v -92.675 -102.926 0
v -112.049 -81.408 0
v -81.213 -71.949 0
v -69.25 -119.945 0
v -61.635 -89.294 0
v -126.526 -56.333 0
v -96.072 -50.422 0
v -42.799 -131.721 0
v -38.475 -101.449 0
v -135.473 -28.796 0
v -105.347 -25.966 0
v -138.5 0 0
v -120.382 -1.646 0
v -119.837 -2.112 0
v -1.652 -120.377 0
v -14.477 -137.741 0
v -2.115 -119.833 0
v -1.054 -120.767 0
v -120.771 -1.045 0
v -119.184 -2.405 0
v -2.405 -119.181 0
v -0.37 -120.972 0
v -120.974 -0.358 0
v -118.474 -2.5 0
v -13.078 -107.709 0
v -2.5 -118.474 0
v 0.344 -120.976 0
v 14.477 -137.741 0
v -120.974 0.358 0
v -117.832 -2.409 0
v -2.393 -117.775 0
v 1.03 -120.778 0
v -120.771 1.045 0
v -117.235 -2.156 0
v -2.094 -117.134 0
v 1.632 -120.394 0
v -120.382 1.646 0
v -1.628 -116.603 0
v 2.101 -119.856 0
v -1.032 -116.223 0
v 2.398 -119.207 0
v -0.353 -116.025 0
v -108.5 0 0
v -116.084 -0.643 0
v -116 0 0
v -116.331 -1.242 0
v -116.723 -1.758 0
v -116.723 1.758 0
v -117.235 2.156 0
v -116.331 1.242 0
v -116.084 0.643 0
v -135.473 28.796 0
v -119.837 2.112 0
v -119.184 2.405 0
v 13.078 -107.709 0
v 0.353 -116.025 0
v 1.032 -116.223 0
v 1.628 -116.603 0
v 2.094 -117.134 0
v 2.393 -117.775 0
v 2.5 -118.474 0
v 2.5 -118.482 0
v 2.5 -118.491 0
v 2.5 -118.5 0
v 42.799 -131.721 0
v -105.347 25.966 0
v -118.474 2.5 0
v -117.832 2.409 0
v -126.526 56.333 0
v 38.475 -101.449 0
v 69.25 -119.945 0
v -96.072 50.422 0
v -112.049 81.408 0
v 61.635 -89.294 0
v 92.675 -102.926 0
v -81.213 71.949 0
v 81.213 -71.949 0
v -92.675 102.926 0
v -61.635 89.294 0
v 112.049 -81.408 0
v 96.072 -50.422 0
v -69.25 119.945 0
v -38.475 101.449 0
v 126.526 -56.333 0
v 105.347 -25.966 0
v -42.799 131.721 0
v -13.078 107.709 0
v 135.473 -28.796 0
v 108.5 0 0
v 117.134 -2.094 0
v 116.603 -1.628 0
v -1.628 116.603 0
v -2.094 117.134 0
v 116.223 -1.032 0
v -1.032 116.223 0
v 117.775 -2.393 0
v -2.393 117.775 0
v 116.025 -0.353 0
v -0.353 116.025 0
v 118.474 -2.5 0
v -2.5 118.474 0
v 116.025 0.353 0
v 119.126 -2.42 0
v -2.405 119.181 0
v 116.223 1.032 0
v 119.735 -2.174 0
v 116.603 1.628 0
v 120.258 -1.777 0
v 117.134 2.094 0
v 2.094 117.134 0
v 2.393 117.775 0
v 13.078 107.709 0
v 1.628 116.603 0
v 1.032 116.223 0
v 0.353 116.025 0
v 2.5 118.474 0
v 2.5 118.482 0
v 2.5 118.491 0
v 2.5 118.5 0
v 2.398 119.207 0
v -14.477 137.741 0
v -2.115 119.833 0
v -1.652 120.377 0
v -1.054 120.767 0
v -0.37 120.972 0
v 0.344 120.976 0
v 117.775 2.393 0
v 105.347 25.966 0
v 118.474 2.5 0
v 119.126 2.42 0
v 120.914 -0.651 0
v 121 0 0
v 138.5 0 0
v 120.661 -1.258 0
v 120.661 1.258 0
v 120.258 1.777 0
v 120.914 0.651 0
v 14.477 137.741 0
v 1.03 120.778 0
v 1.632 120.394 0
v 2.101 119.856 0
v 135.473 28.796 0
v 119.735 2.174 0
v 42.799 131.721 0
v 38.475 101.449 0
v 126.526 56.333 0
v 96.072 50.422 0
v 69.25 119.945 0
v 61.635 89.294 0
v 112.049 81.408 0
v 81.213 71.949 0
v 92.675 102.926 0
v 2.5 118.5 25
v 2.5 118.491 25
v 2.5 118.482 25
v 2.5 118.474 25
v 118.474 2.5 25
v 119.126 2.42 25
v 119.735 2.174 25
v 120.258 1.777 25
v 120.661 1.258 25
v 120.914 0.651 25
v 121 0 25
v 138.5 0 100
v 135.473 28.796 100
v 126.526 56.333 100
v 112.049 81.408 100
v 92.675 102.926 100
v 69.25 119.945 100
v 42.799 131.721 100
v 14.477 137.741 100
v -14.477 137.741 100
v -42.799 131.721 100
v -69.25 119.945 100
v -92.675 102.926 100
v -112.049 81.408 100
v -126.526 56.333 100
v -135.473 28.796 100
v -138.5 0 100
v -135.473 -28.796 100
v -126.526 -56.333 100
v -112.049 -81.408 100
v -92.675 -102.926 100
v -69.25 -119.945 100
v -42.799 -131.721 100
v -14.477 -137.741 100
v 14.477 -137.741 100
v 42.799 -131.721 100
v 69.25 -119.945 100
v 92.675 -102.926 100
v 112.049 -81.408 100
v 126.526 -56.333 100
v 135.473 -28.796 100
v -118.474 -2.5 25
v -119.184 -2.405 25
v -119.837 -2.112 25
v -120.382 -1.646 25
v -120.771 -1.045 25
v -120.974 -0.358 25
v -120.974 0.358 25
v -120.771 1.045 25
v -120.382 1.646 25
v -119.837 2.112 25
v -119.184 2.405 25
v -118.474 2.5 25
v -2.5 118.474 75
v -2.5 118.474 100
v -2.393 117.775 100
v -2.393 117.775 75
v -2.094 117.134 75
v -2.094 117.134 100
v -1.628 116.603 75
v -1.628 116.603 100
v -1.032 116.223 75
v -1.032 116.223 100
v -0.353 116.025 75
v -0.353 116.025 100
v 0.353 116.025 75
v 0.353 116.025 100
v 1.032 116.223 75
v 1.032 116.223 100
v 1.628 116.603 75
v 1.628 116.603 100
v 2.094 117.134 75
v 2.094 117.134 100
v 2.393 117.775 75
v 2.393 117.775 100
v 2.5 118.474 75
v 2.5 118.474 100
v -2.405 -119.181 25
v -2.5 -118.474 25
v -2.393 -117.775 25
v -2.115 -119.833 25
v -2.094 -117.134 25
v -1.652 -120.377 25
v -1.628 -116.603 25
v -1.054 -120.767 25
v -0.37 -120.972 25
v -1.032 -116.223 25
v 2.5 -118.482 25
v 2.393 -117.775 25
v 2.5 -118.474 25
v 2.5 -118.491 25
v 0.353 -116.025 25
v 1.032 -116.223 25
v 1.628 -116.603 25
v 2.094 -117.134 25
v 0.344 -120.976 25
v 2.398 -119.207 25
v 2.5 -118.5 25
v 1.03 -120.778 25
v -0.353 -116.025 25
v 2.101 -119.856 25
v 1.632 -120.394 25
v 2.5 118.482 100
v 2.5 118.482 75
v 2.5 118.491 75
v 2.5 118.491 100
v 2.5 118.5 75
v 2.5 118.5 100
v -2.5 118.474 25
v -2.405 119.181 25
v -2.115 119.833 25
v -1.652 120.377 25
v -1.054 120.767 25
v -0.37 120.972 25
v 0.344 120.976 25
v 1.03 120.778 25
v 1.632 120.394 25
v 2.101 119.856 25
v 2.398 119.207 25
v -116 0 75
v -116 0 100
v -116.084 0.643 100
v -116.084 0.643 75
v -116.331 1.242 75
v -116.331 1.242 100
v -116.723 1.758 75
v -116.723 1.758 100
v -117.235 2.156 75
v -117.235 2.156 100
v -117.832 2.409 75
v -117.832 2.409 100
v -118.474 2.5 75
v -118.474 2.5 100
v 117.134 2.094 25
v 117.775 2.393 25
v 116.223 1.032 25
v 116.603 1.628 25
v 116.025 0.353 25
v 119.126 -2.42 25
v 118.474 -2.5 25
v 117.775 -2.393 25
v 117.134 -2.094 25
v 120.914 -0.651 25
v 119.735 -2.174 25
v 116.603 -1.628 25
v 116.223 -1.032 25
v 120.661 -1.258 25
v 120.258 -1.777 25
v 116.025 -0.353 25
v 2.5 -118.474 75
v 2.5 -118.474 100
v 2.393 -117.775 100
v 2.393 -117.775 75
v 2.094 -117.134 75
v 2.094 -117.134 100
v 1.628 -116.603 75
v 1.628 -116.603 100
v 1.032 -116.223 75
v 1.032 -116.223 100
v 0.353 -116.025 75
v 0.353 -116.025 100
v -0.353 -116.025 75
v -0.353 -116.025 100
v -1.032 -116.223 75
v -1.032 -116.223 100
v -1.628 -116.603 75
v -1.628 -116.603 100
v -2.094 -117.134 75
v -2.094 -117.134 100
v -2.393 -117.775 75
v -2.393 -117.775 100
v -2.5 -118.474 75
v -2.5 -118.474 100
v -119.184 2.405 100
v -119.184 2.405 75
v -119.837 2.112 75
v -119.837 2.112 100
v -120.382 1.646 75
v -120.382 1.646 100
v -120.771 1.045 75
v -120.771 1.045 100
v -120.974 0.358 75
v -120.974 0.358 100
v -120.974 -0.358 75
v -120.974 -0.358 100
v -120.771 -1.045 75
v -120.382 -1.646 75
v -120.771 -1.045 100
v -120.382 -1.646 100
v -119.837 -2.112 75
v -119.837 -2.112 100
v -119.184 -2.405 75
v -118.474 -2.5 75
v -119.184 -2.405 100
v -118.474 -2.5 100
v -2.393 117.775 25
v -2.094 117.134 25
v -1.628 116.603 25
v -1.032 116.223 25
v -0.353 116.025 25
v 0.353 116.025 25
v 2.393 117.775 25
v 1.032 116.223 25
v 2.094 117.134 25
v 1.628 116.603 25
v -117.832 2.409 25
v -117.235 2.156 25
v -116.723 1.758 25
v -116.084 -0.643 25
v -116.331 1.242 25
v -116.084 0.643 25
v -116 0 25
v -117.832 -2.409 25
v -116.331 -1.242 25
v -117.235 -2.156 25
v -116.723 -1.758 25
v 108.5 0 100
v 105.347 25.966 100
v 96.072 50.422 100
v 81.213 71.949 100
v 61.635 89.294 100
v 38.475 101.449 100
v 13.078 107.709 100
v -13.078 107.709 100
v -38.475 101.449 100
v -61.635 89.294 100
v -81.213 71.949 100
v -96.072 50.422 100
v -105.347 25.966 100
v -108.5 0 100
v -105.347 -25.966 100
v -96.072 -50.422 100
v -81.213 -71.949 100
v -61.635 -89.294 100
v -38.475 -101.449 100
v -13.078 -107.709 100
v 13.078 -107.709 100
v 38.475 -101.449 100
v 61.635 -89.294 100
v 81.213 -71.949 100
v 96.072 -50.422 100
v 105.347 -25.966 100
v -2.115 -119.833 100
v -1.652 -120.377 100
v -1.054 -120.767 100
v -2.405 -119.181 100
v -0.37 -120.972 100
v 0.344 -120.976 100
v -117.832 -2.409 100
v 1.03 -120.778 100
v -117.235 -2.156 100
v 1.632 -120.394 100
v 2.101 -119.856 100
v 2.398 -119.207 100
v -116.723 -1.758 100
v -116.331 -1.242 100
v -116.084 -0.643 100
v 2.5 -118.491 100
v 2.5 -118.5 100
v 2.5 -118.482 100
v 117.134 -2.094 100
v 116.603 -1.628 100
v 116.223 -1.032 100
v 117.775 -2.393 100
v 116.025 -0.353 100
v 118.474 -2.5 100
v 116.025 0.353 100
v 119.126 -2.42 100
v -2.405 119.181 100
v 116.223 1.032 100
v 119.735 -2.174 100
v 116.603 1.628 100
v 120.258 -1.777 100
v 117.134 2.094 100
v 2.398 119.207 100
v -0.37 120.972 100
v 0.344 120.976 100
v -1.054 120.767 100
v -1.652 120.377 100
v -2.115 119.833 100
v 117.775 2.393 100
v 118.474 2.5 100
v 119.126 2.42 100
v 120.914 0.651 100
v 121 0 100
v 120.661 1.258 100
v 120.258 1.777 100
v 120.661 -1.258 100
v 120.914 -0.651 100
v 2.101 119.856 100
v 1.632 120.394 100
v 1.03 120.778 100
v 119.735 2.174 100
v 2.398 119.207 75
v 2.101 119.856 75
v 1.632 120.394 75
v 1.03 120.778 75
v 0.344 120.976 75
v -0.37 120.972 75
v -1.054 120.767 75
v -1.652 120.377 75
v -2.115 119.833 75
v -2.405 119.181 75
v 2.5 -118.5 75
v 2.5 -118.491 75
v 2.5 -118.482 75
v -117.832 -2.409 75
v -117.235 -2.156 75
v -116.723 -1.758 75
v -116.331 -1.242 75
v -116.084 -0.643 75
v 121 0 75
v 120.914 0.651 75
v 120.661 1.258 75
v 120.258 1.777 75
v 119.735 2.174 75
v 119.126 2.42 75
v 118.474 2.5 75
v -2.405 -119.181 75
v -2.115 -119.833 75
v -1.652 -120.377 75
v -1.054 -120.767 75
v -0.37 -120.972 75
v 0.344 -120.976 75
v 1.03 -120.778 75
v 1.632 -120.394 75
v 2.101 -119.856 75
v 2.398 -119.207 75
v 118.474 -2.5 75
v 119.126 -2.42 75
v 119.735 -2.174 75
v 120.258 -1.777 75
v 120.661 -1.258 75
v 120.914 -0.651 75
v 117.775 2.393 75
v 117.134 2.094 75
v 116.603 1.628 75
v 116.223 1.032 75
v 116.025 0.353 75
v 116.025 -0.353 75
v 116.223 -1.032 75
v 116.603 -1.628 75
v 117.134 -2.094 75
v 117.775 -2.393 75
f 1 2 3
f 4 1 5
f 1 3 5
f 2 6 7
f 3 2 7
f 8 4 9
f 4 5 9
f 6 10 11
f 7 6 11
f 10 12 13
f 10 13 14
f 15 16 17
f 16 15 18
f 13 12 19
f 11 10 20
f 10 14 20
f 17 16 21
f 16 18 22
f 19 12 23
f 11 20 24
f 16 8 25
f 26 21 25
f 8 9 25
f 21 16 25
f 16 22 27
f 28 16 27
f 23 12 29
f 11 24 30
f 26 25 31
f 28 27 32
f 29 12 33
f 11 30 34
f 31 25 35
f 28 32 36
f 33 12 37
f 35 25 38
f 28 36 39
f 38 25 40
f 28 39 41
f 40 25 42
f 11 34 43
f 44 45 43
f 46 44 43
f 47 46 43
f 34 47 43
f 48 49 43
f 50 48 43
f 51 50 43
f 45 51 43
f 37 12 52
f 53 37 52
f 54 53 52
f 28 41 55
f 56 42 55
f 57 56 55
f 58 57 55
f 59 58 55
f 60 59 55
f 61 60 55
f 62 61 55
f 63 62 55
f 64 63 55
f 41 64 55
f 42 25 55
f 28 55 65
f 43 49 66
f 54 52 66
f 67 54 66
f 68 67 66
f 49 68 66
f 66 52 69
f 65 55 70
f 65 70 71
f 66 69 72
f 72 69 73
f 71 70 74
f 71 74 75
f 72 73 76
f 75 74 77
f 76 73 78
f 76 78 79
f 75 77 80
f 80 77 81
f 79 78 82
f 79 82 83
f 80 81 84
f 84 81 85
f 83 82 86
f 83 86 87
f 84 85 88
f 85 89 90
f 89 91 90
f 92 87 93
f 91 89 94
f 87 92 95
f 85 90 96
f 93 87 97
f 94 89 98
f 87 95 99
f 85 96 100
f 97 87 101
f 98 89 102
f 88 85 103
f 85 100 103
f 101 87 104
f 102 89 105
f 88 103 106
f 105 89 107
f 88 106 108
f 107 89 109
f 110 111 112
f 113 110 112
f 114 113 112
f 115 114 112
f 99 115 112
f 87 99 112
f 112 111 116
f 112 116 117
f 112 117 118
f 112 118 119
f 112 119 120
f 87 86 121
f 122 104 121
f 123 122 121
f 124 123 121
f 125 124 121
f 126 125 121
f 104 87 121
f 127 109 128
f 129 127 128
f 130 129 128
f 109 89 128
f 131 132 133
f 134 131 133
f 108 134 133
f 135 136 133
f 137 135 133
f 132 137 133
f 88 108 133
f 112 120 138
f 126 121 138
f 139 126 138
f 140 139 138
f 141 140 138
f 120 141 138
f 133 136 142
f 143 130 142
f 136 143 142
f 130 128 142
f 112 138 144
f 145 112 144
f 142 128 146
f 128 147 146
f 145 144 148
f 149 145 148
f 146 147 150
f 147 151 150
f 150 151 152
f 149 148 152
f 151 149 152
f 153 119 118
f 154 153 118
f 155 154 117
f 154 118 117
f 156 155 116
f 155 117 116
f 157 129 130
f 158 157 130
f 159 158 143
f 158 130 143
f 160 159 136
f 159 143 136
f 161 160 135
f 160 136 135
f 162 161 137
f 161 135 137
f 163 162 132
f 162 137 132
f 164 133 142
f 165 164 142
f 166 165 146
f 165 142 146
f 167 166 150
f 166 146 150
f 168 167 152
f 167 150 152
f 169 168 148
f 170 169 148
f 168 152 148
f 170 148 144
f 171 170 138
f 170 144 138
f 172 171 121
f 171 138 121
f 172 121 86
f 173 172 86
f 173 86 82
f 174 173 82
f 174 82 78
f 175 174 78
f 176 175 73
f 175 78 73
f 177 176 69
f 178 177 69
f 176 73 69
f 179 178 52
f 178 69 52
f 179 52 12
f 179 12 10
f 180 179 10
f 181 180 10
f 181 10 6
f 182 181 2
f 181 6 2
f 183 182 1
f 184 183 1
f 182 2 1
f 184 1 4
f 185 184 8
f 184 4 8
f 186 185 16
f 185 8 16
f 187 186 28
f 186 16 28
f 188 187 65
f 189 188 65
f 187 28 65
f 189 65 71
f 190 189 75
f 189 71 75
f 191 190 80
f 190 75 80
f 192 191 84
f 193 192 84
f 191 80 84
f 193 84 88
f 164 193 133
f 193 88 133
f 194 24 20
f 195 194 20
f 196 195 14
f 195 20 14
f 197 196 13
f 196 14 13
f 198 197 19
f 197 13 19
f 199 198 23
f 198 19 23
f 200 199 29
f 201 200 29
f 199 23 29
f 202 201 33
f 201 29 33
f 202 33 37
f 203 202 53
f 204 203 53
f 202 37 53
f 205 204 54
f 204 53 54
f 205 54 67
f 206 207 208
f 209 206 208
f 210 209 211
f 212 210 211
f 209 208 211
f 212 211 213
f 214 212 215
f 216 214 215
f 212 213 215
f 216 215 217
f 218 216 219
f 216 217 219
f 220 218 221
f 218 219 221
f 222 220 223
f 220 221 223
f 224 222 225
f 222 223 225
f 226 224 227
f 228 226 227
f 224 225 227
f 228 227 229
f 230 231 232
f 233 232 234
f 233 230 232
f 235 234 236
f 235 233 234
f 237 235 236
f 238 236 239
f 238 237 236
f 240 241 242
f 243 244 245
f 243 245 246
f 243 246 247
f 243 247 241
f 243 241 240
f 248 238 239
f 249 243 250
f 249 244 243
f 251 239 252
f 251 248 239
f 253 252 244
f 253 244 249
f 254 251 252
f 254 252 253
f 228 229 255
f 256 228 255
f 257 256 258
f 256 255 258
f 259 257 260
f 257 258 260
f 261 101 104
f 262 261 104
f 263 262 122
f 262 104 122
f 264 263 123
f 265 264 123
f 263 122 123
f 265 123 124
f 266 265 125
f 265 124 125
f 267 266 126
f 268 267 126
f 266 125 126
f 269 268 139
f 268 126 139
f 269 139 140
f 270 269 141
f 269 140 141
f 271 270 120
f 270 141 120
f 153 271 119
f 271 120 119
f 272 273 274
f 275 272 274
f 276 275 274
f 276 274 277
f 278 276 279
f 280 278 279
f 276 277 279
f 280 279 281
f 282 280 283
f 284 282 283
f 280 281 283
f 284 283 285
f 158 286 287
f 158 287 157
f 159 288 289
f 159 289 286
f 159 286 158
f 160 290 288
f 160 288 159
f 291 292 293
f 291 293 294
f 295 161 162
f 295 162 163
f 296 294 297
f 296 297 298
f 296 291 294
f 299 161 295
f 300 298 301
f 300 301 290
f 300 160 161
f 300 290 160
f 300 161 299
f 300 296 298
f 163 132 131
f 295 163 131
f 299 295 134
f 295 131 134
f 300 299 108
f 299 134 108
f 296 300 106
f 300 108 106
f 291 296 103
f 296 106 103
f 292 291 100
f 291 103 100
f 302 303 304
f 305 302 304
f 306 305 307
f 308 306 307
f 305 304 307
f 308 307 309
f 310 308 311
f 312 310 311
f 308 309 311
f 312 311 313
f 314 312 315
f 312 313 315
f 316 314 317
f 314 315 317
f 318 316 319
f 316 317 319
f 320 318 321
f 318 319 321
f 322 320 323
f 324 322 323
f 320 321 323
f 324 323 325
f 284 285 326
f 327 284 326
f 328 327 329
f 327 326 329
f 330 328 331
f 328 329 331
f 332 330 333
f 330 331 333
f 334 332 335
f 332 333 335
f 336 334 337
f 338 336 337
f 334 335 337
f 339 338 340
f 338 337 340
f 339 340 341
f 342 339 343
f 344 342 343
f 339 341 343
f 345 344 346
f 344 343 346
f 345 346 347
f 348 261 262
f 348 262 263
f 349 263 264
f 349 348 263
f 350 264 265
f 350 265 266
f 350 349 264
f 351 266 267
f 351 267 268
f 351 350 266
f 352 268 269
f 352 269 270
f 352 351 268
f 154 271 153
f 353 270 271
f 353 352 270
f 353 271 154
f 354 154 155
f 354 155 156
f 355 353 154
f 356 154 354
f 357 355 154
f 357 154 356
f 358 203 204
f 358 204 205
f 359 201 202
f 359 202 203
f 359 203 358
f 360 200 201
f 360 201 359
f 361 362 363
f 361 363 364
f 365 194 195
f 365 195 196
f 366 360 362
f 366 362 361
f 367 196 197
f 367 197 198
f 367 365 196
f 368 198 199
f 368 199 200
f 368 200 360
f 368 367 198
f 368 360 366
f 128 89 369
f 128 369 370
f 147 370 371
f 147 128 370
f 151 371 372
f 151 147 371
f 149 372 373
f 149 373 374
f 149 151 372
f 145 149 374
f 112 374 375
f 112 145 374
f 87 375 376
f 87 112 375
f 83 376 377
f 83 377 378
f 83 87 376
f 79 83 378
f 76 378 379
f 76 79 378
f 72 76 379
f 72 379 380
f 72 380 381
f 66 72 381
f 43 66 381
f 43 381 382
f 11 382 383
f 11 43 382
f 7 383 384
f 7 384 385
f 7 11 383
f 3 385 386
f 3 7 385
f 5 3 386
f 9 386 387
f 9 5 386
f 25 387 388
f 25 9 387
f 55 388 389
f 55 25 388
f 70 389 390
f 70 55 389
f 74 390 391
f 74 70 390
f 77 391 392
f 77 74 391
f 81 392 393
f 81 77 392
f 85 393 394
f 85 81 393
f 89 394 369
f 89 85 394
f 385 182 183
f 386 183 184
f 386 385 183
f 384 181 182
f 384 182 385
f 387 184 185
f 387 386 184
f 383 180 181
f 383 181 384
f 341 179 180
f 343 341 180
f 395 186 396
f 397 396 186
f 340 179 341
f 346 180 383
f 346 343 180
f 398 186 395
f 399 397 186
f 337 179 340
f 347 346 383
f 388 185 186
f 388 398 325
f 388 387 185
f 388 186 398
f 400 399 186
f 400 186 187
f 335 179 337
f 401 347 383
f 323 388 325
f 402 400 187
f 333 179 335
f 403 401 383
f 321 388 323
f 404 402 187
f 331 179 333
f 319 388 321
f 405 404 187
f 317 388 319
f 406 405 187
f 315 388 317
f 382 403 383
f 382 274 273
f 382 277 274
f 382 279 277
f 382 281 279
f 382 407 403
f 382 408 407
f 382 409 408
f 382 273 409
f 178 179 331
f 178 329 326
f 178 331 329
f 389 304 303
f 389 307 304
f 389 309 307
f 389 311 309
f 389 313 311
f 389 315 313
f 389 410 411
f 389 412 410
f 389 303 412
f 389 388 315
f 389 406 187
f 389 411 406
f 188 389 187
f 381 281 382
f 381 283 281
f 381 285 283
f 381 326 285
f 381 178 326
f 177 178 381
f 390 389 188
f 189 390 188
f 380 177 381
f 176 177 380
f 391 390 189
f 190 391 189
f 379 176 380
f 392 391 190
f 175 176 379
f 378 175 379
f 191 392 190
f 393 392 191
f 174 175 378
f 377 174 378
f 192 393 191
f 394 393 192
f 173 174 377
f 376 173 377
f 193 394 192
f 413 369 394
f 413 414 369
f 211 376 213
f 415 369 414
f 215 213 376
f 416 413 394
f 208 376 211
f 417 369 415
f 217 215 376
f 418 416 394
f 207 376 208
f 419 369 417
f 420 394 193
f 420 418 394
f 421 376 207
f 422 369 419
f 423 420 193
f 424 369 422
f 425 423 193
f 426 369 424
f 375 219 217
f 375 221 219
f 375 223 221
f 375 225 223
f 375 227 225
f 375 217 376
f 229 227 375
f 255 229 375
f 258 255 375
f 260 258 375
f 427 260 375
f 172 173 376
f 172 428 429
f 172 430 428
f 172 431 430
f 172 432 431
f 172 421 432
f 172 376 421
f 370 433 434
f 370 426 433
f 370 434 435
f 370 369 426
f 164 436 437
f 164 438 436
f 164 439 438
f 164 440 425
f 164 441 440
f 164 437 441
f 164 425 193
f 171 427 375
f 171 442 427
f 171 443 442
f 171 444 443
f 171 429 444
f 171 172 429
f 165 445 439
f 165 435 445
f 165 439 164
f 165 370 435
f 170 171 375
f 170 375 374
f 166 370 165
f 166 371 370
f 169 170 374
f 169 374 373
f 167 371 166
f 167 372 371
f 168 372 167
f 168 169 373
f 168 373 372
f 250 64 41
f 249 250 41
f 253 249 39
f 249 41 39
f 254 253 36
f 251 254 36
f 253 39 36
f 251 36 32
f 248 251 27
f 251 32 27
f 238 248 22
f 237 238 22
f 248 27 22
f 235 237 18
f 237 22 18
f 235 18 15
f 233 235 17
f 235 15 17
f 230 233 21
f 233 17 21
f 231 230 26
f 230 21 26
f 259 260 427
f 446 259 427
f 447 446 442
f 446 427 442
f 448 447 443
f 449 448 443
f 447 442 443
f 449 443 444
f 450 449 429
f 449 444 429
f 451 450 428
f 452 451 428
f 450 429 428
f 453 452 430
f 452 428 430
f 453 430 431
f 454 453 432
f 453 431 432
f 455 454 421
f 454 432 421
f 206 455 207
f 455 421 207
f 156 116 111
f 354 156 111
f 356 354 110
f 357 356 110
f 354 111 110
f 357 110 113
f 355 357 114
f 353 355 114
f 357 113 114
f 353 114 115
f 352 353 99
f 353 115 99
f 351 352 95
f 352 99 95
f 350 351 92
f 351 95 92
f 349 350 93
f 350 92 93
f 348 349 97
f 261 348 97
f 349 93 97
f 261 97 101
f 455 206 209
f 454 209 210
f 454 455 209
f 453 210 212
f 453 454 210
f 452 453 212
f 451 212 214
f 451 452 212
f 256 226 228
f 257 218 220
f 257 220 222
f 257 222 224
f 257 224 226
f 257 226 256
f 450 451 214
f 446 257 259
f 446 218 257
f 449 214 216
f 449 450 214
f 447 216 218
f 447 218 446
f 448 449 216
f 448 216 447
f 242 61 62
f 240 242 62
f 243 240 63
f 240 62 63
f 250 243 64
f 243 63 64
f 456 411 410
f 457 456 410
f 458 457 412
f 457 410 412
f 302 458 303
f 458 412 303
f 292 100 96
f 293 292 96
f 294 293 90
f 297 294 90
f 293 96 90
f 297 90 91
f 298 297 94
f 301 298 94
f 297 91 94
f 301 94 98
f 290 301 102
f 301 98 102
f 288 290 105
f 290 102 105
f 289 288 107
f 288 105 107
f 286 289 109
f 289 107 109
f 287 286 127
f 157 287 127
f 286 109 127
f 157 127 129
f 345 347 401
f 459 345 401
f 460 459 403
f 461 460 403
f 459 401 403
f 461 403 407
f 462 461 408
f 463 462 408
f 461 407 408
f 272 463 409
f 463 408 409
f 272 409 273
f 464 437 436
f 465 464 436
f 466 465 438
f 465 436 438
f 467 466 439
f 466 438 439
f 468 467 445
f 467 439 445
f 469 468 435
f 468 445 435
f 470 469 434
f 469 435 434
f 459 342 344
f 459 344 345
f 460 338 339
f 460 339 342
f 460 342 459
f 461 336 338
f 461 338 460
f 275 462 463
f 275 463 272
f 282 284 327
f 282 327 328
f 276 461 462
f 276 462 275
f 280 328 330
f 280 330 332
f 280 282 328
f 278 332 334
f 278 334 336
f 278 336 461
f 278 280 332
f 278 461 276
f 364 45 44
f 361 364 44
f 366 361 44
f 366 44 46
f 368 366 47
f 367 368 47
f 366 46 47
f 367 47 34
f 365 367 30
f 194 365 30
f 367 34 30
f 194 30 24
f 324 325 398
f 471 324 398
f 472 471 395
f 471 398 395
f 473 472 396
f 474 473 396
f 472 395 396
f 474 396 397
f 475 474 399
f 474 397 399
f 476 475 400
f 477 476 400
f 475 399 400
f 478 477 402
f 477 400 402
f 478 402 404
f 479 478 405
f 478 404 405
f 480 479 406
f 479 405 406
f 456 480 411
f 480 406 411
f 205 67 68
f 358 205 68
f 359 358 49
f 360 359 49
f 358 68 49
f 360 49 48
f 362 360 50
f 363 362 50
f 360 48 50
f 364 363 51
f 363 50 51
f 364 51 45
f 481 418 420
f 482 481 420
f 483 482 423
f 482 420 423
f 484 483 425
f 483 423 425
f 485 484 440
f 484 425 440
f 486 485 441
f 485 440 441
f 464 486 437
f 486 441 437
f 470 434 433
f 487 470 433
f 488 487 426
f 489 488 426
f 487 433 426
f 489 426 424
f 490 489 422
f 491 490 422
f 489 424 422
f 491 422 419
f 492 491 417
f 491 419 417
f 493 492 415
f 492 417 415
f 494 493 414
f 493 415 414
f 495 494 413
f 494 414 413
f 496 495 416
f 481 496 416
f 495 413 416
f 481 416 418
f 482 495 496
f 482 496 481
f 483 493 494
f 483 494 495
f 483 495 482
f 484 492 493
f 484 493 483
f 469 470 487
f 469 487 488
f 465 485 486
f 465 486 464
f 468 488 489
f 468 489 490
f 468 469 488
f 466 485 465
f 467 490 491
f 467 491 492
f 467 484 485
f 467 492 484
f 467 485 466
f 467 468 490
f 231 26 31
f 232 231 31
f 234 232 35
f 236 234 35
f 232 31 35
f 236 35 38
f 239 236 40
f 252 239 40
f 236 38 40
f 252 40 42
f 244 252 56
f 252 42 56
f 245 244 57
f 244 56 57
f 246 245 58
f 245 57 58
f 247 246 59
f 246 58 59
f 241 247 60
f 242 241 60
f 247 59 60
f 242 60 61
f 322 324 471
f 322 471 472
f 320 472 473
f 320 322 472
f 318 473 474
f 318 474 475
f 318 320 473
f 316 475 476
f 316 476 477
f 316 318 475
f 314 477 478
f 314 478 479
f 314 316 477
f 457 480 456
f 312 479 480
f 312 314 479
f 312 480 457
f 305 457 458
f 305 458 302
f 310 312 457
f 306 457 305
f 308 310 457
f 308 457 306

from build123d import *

# Parameters (mm, degrees)
F0_R     = 138.5
F0_R_2   = 108.5
F1_DEPTH = 100
F3_DEPTH = 25
F5_DEPTH = 25


with BuildPart() as f1:
    # F0 (on Top) → F1 (new body)
    with BuildSketch(Plane.XY):
        Circle(F0_R)
        Circle(F0_R_2, mode=Mode.SUBTRACT)
    extrude(amount=F1_DEPTH)

    # F2 (on face) → F3 (cut)
    with BuildSketch(Plane.XY.offset(100)):
        with BuildLine():
            ThreePointArc((-2.499860907, 118.473628692), (0, 118.5), (2.499860907, 118.473628692))
            ThreePointArc((2.499860907, 118.473628692), (2.4999652265, 118.4868141626), (2.5, 118.5))
            ThreePointArc((2.5, 118.5), (-0.0131858374, 120.9999652265), (-2.499860907, 118.473628692))
        make_face()
        with BuildLine():
            ThreePointArc((-2.499860907, 118.473628692), (0, 116), (2.499860907, 118.473628692))
            ThreePointArc((2.499860907, 118.473628692), (0, 118.5), (-2.499860907, 118.473628692))
        make_face()
        with BuildLine():
            ThreePointArc((-116, 0), (-116.7229338406, 1.7584185693), (-118.473628692, 2.499860907))
            ThreePointArc((-118.473628692, 2.499860907), (-118.5, 0), (-118.473628692, -2.499860907))
            ThreePointArc((-118.473628692, -2.499860907), (-116.7229338406, -1.7584185693), (-116, 0))
        make_face()
        with BuildLine():
            ThreePointArc((-118.473628692, -2.499860907), (-118.5, 0), (-118.473628692, 2.499860907))
            ThreePointArc((-118.473628692, 2.499860907), (-121, 0), (-118.473628692, -2.499860907))
        make_face()
        with BuildLine():
            ThreePointArc((118.473628692, -2.499860907), (118.4934069896, -1.25), (118.5, 0))
            ThreePointArc((118.5, 0), (118.4934069896, 1.25), (118.473628692, 2.499860907))
            ThreePointArc((118.473628692, 2.499860907), (116, 0), (118.473628692, -2.499860907))
        make_face()
        with BuildLine():
            ThreePointArc((118.473628692, 2.499860907), (118.4934069896, 1.25), (118.5, 0))
            ThreePointArc((118.5, 0), (118.4934069896, -1.25), (118.473628692, -2.499860907))
            ThreePointArc((118.473628692, -2.499860907), (120.2584185693, -1.7770661594), (121, 0))
            ThreePointArc((121, 0), (120.2584185693, 1.7770661594), (118.473628692, 2.499860907))
        make_face()
        with BuildLine():
            ThreePointArc((-2.499860907, -118.473628692), (0, -118.5), (2.499860907, -118.473628692))
            ThreePointArc((2.499860907, -118.473628692), (0, -116), (-2.499860907, -118.473628692))
        make_face()
        with BuildLine():
            ThreePointArc((2.5, -118.5), (2.4999652265, -118.4868141626), (2.499860907, -118.473628692))
            ThreePointArc((2.499860907, -118.473628692), (0, -118.5), (-2.499860907, -118.473628692))
            ThreePointArc((-2.499860907, -118.473628692), (-0.0131858374, -120.9999652265), (2.5, -118.5))
        make_face()
    extrude(amount=-F3_DEPTH, mode=Mode.SUBTRACT)

    # F4 (on face) → F5 (cut)
    with BuildSketch(Plane(origin=(0, 0, 0), x_dir=(1, 0, 0), z_dir=(0, 0, -1))):
        with BuildLine():
            ThreePointArc((-2.499860907, 118.473628692), (0, 118.5), (2.499860907, 118.473628692))
            ThreePointArc((2.499860907, 118.473628692), (2.4999652265, 118.4868141626), (2.5, 118.5))
            ThreePointArc((2.5, 118.5), (-0.0131858374, 120.9999652265), (-2.499860907, 118.473628692))
        make_face()
        with BuildLine():
            ThreePointArc((-2.499860907, 118.473628692), (0, 116), (2.499860907, 118.473628692))
            ThreePointArc((2.499860907, 118.473628692), (0, 118.5), (-2.499860907, 118.473628692))
        make_face()
        with BuildLine():
            ThreePointArc((-118.473628692, -2.499860907), (-118.5, 0), (-118.473628692, 2.499860907))
            ThreePointArc((-118.473628692, 2.499860907), (-121, 0), (-118.473628692, -2.499860907))
        make_face()
        with BuildLine():
            ThreePointArc((-116, 0), (-116.7229338406, 1.7584185693), (-118.473628692, 2.499860907))
            ThreePointArc((-118.473628692, 2.499860907), (-118.5, 0), (-118.473628692, -2.499860907))
            ThreePointArc((-118.473628692, -2.499860907), (-116.7229338406, -1.7584185693), (-116, 0))
        make_face()
        with BuildLine():
            ThreePointArc((118.473628692, -2.499860907), (118.4934069896, -1.25), (118.5, 0))
            ThreePointArc((118.5, 0), (118.4934069896, 1.25), (118.473628692, 2.499860907))
            ThreePointArc((118.473628692, 2.499860907), (116, 0), (118.473628692, -2.499860907))
        make_face()
        with BuildLine():
            ThreePointArc((118.473628692, 2.499860907), (118.4934069896, 1.25), (118.5, 0))
            ThreePointArc((118.5, 0), (118.4934069896, -1.25), (118.473628692, -2.499860907))
            ThreePointArc((118.473628692, -2.499860907), (120.2584185693, -1.7770661594), (121, 0))
            ThreePointArc((121, 0), (120.2584185693, 1.7770661594), (118.473628692, 2.499860907))
        make_face()
        with BuildLine():
            ThreePointArc((-2.499860907, -118.473628692), (0, -118.5), (2.499860907, -118.473628692))
            ThreePointArc((2.499860907, -118.473628692), (0, -116), (-2.499860907, -118.473628692))
        make_face()
        with BuildLine():
            ThreePointArc((2.5, -118.5), (2.4999652265, -118.4868141626), (2.499860907, -118.473628692))
            ThreePointArc((2.499860907, -118.473628692), (0, -118.5), (-2.499860907, -118.473628692))
            ThreePointArc((-2.499860907, -118.473628692), (-0.0131858374, -120.9999652265), (2.5, -118.5))
        make_face()
    extrude(amount=-F5_DEPTH, mode=Mode.SUBTRACT)


solid = f1.part
